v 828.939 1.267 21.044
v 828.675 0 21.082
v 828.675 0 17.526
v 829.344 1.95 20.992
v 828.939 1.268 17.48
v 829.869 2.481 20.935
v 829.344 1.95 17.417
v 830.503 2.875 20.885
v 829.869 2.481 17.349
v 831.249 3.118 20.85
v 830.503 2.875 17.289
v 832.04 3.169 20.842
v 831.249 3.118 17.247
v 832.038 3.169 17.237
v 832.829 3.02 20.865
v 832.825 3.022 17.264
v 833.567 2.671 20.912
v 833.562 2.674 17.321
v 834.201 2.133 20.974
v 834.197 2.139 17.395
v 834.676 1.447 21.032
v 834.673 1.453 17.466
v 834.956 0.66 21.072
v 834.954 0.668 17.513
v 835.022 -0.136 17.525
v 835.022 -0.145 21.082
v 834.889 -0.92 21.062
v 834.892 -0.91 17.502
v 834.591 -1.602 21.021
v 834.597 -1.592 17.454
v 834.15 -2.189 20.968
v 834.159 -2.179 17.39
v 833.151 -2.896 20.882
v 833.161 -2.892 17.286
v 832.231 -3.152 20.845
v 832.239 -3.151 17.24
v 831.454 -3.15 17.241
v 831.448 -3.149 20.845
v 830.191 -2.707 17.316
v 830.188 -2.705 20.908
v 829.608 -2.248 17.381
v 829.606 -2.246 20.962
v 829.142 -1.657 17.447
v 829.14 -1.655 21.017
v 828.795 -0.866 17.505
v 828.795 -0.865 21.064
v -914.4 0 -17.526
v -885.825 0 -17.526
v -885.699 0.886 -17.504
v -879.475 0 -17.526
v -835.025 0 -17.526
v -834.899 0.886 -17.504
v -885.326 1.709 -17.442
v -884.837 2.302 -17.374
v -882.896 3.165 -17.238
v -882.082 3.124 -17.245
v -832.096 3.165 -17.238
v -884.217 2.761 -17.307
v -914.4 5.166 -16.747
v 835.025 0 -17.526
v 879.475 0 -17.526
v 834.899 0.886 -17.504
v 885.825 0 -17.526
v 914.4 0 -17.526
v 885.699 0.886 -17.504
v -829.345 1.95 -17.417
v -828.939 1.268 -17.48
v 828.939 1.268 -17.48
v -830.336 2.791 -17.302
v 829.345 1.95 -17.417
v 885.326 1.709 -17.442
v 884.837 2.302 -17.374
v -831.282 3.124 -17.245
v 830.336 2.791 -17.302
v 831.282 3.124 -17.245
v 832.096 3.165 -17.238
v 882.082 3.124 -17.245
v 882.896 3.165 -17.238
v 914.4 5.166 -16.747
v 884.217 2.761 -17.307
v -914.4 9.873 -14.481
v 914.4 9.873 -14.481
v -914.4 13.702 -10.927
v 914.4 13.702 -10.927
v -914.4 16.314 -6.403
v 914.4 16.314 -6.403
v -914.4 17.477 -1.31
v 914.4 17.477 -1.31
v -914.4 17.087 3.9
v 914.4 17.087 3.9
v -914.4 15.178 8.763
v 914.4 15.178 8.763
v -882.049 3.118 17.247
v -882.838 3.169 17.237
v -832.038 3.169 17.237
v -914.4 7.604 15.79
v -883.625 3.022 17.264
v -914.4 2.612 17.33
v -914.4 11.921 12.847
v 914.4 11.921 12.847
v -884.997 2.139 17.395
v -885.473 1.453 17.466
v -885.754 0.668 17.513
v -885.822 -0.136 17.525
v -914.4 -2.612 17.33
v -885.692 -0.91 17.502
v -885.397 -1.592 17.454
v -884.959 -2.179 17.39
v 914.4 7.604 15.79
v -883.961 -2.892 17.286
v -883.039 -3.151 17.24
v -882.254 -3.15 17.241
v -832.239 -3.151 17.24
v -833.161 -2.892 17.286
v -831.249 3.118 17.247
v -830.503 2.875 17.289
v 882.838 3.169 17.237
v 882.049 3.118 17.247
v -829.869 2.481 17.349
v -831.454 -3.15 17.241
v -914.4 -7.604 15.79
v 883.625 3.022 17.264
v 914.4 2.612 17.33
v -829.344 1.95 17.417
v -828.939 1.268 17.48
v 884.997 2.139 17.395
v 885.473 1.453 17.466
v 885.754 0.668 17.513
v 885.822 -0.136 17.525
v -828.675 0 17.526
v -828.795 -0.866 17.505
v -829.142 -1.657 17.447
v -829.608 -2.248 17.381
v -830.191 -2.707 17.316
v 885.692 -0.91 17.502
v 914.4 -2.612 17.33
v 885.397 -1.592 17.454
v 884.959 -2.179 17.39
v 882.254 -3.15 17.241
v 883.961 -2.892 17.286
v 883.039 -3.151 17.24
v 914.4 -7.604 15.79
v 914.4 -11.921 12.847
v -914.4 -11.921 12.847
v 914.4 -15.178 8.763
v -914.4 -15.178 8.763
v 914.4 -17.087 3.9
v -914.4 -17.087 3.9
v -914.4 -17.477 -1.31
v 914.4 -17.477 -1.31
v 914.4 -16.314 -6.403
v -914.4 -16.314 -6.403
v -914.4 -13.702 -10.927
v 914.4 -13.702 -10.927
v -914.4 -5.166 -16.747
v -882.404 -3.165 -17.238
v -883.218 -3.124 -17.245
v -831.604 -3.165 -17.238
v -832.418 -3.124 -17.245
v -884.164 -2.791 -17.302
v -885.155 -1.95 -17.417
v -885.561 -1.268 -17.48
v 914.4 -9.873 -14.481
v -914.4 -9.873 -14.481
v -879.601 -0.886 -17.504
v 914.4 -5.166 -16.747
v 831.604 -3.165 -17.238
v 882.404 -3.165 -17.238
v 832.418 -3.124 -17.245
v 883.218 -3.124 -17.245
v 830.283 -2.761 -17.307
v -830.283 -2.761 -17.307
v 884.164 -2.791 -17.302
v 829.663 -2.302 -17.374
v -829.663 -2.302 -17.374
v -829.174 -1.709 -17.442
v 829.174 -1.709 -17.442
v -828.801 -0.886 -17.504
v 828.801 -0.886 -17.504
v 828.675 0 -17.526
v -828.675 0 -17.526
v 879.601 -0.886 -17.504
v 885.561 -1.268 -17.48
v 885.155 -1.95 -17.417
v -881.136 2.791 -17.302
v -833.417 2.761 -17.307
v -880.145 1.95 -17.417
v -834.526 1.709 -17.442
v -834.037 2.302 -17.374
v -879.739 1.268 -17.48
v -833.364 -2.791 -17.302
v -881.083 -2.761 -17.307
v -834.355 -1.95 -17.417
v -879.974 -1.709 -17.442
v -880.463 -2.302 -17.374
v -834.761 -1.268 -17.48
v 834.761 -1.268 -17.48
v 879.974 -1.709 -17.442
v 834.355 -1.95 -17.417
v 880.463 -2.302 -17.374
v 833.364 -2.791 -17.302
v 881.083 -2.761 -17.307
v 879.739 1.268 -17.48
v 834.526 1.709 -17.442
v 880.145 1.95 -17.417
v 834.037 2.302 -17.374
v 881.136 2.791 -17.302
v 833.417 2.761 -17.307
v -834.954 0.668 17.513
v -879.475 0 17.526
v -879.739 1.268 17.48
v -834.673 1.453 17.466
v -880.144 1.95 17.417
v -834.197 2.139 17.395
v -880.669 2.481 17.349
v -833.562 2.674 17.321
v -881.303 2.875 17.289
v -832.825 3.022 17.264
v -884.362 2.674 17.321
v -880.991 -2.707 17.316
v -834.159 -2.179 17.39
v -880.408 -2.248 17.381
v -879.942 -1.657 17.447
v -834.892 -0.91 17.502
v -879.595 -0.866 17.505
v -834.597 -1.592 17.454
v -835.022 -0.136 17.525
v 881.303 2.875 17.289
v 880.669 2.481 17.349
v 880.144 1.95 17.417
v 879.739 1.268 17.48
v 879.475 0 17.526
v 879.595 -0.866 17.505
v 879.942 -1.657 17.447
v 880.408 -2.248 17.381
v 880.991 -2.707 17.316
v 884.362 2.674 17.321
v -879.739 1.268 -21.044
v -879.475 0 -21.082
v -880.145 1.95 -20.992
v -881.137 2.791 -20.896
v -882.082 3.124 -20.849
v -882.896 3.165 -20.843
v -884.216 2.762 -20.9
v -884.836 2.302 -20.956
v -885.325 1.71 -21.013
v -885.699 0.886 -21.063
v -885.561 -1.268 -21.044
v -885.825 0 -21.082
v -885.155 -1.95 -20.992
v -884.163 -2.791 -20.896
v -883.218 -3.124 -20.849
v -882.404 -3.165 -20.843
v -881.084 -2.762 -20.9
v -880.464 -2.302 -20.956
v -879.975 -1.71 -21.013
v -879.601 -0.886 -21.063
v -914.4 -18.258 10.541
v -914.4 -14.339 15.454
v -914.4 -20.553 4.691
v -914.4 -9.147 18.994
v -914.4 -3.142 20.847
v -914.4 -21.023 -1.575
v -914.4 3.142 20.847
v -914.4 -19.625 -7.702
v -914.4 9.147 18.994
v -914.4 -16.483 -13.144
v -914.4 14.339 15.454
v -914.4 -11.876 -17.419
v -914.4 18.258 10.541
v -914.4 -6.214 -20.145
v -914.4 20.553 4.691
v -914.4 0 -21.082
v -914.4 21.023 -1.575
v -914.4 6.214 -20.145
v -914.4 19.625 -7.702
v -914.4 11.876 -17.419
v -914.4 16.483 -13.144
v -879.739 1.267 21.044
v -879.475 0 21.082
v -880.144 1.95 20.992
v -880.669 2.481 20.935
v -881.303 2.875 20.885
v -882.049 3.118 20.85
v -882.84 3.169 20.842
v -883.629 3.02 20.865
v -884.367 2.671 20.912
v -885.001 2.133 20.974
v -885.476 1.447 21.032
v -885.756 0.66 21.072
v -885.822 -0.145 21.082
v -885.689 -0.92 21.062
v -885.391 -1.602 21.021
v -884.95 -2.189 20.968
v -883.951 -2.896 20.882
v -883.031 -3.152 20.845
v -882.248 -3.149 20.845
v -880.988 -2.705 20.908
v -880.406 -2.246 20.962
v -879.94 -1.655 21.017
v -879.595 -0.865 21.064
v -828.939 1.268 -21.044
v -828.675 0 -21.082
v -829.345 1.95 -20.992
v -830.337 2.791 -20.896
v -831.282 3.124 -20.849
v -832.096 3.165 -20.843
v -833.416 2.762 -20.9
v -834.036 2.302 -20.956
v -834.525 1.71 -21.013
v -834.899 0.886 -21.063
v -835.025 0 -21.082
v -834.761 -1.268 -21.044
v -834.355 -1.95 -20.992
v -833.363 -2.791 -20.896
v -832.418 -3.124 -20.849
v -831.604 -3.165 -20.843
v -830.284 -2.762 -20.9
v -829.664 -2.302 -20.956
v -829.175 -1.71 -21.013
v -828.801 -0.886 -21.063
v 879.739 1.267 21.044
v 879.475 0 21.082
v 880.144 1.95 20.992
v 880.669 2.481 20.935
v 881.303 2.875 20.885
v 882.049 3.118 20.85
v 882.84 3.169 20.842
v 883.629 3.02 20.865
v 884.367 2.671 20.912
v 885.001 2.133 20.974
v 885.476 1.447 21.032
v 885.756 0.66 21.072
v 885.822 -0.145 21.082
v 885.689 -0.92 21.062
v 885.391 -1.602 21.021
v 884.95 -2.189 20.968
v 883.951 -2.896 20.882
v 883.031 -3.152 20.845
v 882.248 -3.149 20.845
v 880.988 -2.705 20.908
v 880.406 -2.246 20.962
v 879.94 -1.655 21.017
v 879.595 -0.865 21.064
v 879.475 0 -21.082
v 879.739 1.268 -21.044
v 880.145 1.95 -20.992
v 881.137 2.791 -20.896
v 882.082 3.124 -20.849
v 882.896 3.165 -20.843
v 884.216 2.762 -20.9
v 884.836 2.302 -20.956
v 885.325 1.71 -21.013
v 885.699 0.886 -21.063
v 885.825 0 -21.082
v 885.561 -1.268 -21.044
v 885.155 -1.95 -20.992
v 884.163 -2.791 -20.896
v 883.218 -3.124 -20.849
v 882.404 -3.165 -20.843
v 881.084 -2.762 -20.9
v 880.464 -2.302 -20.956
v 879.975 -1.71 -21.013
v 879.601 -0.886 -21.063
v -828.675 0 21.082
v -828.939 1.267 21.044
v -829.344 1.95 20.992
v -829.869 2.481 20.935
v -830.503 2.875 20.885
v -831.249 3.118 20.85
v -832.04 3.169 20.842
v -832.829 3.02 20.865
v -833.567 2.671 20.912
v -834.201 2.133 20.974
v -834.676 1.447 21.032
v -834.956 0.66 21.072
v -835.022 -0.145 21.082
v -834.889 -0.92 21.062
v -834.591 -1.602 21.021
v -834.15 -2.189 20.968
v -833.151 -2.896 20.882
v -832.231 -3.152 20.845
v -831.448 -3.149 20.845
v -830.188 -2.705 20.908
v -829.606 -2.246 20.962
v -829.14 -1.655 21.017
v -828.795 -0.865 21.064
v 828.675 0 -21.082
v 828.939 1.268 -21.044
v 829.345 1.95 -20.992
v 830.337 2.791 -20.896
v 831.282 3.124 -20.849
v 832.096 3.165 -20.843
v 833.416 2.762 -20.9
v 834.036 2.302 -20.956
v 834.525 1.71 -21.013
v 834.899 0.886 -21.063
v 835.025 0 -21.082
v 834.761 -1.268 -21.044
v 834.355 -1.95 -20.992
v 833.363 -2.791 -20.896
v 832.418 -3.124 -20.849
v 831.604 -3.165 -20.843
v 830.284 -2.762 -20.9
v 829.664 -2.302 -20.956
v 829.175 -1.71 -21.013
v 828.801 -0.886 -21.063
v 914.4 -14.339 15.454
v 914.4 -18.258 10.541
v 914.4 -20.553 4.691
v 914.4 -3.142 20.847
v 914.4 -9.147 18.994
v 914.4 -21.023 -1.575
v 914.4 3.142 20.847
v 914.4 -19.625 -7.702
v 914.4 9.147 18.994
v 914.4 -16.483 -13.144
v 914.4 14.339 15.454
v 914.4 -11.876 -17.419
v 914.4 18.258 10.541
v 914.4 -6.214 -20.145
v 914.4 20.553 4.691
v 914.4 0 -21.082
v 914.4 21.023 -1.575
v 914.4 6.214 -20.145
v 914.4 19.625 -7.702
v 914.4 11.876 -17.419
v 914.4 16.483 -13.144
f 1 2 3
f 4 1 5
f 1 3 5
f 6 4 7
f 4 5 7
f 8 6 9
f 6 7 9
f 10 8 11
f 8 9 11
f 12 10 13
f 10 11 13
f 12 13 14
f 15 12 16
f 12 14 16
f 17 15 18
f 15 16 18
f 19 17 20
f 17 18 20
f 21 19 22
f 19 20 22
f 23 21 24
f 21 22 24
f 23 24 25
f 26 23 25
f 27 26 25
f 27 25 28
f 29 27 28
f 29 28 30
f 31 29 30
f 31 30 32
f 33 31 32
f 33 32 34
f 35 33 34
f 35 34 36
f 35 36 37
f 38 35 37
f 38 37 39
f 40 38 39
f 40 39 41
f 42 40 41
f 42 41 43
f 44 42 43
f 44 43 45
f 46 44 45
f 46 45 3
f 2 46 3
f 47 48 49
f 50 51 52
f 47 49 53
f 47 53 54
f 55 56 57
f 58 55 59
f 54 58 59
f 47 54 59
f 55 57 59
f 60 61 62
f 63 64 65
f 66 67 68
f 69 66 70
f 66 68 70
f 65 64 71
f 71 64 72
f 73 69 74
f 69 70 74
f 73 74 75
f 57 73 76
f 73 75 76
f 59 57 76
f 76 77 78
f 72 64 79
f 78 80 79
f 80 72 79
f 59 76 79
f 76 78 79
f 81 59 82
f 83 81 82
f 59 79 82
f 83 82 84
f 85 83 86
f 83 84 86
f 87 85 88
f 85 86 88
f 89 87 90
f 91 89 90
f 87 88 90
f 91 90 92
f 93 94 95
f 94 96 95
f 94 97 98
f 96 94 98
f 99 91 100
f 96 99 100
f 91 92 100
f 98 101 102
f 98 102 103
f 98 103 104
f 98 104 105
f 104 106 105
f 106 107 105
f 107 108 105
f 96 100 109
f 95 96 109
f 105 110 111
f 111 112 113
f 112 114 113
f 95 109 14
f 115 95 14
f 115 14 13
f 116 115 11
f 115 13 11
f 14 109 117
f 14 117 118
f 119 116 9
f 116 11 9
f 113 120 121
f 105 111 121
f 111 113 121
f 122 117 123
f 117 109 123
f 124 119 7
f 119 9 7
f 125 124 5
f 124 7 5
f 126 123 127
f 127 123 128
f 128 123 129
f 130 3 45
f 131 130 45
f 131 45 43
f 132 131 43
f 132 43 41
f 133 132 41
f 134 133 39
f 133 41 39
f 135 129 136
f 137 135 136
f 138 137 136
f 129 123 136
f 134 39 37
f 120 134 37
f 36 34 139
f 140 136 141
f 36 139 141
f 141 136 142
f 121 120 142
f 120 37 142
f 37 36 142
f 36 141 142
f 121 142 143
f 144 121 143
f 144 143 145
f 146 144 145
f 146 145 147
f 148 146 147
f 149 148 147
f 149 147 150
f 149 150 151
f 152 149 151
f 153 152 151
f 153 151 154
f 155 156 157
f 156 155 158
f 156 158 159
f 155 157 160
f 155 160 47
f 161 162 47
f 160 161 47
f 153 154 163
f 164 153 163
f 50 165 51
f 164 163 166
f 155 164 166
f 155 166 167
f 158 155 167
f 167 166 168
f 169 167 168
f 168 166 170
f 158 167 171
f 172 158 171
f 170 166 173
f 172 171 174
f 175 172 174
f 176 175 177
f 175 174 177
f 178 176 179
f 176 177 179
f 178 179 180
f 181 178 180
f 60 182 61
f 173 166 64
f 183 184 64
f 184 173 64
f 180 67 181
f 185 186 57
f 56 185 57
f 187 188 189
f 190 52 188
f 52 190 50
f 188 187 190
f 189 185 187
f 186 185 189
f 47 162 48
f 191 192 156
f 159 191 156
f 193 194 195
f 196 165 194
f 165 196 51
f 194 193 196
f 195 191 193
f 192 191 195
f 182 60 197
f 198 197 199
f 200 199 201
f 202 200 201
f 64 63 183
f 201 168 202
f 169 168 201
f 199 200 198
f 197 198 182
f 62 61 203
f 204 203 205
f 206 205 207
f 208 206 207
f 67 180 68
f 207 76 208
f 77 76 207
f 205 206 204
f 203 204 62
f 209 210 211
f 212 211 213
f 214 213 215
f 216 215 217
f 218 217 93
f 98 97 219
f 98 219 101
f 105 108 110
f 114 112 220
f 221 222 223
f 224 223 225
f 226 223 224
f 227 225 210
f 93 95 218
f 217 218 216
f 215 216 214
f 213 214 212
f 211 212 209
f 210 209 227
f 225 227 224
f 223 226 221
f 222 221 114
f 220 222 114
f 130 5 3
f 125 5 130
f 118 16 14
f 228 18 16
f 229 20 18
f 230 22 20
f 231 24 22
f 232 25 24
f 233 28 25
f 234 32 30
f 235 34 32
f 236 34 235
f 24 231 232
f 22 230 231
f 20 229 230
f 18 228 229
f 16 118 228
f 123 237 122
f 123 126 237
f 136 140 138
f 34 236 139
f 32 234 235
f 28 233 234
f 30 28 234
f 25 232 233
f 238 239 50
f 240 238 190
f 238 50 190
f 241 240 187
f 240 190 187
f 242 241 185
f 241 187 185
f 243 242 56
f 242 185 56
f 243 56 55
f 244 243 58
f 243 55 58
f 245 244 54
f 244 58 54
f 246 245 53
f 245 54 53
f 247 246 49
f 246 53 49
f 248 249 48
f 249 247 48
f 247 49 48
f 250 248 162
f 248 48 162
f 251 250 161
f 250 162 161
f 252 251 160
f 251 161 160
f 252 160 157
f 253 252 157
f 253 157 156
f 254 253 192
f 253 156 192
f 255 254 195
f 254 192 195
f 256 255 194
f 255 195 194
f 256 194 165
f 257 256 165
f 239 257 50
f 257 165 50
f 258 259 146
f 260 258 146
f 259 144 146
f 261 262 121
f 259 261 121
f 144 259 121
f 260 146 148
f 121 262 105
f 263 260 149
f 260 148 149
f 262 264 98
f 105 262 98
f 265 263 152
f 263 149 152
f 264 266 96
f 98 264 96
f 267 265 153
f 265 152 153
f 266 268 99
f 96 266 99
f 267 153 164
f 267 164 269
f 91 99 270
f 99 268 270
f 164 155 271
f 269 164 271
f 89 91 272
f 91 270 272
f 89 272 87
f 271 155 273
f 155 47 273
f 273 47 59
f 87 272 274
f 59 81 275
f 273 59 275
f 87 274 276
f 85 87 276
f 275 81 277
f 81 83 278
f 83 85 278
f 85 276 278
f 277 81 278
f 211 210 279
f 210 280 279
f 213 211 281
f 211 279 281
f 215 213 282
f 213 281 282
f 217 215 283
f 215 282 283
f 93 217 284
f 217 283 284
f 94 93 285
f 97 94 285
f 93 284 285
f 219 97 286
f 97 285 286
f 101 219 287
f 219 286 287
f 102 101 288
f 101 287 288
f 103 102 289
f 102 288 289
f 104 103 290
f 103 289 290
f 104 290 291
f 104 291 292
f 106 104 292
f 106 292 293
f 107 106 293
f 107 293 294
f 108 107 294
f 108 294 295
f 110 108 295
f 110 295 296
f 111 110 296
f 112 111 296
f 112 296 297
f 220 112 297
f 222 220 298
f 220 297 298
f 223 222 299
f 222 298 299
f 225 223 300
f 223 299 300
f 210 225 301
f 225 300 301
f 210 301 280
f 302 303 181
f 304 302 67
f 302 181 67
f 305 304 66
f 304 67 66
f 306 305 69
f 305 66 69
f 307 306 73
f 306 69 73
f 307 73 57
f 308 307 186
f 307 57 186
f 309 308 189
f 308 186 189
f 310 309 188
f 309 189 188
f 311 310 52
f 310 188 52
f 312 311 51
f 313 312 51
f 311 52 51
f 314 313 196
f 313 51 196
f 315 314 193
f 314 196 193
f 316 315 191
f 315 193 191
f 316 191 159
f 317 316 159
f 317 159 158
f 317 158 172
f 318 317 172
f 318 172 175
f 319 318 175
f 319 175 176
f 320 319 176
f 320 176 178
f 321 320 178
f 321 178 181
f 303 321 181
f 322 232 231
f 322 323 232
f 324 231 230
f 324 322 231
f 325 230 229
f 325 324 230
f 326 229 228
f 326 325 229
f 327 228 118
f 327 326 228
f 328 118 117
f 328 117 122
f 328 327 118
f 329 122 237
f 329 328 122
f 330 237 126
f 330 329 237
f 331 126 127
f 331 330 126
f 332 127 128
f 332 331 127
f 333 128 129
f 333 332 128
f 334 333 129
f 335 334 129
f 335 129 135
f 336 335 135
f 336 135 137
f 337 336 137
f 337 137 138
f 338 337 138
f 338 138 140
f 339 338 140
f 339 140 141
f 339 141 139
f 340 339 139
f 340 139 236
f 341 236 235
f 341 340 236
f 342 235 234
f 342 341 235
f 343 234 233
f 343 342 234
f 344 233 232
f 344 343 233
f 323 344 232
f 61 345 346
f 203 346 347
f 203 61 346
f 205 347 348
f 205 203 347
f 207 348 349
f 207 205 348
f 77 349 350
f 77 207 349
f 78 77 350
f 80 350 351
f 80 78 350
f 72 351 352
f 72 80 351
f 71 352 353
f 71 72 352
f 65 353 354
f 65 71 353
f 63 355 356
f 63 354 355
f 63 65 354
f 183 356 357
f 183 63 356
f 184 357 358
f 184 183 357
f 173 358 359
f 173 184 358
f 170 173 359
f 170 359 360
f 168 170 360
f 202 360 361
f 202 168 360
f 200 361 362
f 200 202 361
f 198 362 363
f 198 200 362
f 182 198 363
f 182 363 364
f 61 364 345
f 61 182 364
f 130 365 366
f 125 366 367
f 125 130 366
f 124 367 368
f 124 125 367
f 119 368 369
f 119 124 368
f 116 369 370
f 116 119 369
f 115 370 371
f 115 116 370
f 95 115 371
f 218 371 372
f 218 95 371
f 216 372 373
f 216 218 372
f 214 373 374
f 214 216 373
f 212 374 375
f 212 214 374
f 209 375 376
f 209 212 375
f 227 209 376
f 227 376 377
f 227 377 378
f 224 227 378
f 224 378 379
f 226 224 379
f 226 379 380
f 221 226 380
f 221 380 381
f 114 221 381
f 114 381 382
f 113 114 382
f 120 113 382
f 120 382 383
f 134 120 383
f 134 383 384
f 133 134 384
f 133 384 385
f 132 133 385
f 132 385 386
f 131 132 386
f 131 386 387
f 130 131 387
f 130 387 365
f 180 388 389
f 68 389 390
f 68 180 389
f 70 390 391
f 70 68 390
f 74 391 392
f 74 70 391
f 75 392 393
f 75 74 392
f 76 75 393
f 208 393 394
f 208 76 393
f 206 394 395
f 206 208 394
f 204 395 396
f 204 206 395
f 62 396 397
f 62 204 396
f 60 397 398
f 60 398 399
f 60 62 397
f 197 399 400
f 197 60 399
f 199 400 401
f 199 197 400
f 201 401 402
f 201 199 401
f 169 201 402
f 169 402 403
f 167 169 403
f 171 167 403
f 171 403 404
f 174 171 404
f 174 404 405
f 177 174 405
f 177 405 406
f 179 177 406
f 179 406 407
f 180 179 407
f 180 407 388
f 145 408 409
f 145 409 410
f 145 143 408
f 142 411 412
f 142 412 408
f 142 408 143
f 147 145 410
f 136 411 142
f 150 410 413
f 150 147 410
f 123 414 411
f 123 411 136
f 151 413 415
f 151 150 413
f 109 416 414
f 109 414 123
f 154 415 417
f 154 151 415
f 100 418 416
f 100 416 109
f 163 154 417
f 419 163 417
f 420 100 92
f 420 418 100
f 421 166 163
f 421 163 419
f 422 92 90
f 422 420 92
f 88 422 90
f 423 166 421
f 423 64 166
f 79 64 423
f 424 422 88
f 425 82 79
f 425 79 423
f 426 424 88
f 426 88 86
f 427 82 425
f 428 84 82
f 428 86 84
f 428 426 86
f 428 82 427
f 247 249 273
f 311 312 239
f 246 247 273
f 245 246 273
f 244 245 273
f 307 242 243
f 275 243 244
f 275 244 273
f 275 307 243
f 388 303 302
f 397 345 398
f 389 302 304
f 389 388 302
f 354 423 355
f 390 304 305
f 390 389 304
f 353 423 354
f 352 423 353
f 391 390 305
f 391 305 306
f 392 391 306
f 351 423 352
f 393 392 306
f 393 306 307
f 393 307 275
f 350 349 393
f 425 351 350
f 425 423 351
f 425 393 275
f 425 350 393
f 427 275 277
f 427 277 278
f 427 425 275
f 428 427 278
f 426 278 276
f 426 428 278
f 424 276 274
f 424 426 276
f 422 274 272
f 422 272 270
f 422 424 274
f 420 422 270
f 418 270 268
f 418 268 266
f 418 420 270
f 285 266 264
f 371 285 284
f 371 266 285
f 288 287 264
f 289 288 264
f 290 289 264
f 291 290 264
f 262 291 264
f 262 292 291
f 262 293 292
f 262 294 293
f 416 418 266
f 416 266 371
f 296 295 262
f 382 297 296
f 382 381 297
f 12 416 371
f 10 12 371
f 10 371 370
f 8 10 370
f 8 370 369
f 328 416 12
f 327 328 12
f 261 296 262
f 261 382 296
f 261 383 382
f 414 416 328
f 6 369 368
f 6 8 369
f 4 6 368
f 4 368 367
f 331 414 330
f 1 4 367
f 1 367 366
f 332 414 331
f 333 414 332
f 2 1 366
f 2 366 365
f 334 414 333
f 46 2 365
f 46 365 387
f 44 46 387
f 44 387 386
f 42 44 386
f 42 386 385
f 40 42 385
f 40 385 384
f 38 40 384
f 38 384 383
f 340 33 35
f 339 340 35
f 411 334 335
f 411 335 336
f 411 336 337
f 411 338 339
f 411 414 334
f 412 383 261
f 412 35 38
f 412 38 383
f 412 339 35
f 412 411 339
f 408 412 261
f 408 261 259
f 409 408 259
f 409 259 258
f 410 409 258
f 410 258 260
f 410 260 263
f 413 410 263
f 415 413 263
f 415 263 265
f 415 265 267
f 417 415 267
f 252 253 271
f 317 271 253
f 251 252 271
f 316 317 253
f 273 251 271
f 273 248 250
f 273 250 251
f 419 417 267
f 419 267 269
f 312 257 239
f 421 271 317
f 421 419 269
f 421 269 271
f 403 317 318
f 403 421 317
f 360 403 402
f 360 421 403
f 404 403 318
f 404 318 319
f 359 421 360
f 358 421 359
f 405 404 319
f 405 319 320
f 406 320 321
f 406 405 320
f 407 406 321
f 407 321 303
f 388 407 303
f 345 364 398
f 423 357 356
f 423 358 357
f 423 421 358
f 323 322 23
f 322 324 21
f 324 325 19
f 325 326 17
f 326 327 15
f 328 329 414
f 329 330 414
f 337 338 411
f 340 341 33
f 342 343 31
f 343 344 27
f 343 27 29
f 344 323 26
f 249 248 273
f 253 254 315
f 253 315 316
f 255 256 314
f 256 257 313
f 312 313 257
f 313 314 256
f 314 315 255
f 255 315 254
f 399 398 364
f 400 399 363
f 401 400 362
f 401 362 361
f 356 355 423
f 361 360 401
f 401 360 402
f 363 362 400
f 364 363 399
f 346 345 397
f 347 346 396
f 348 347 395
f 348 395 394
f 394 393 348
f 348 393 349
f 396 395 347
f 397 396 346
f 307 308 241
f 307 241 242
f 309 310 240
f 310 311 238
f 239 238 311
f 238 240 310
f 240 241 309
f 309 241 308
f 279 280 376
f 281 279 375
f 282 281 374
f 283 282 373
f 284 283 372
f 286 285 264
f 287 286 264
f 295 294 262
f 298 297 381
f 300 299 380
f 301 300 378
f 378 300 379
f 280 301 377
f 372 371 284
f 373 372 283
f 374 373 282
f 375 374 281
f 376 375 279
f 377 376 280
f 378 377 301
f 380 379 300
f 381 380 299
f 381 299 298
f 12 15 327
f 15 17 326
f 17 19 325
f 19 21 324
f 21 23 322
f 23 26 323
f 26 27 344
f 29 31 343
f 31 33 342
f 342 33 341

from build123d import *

# Parameters (mm, degrees)
SKETCH1_R                = 21.082
SKETCH1_R_2              = 17.526
BOSS_EXTRUDE1_DEPTH      = 914.4
BOSS_EXTRUDE1_DEPTH_BACK = 914.4
SKETCH2_R                = 3.175
CUT_EXTRUDE1_DEPTH       = 22.082


with BuildPart() as part:
    # Sketch1 → Boss-Extrude1 (new body, two sides)
    with BuildSketch(Plane(origin=(0, 0, 0), x_dir=(0, 0, -1), z_dir=(1, 0, 0))) as boss_extrude1_sk:
        Circle(SKETCH1_R)
        Circle(SKETCH1_R_2, mode=Mode.SUBTRACT)
    extrude(amount=BOSS_EXTRUDE1_DEPTH)
    extrude(boss_extrude1_sk.sketch, amount=-BOSS_EXTRUDE1_DEPTH_BACK)

    # Sketch2 → Cut-Extrude1 (cut, symmetric)
    with BuildSketch(Plane.XY):
        with Locations((-831.85, 0)):
            Circle(SKETCH2_R)
        with Locations((-882.65, 0)):
            Circle(SKETCH2_R)
    cut_extrude1 = extrude(amount=CUT_EXTRUDE1_DEPTH, both=True, mode=Mode.SUBTRACT)

    # Mirror1: Cut-Extrude1 across plane
    add(cut_extrude1.mirror(Plane(origin=(0, 0, 0), x_dir=(0, 0, 1), z_dir=(1, 0, 0))), mode=Mode.SUBTRACT)


solid = part.part
